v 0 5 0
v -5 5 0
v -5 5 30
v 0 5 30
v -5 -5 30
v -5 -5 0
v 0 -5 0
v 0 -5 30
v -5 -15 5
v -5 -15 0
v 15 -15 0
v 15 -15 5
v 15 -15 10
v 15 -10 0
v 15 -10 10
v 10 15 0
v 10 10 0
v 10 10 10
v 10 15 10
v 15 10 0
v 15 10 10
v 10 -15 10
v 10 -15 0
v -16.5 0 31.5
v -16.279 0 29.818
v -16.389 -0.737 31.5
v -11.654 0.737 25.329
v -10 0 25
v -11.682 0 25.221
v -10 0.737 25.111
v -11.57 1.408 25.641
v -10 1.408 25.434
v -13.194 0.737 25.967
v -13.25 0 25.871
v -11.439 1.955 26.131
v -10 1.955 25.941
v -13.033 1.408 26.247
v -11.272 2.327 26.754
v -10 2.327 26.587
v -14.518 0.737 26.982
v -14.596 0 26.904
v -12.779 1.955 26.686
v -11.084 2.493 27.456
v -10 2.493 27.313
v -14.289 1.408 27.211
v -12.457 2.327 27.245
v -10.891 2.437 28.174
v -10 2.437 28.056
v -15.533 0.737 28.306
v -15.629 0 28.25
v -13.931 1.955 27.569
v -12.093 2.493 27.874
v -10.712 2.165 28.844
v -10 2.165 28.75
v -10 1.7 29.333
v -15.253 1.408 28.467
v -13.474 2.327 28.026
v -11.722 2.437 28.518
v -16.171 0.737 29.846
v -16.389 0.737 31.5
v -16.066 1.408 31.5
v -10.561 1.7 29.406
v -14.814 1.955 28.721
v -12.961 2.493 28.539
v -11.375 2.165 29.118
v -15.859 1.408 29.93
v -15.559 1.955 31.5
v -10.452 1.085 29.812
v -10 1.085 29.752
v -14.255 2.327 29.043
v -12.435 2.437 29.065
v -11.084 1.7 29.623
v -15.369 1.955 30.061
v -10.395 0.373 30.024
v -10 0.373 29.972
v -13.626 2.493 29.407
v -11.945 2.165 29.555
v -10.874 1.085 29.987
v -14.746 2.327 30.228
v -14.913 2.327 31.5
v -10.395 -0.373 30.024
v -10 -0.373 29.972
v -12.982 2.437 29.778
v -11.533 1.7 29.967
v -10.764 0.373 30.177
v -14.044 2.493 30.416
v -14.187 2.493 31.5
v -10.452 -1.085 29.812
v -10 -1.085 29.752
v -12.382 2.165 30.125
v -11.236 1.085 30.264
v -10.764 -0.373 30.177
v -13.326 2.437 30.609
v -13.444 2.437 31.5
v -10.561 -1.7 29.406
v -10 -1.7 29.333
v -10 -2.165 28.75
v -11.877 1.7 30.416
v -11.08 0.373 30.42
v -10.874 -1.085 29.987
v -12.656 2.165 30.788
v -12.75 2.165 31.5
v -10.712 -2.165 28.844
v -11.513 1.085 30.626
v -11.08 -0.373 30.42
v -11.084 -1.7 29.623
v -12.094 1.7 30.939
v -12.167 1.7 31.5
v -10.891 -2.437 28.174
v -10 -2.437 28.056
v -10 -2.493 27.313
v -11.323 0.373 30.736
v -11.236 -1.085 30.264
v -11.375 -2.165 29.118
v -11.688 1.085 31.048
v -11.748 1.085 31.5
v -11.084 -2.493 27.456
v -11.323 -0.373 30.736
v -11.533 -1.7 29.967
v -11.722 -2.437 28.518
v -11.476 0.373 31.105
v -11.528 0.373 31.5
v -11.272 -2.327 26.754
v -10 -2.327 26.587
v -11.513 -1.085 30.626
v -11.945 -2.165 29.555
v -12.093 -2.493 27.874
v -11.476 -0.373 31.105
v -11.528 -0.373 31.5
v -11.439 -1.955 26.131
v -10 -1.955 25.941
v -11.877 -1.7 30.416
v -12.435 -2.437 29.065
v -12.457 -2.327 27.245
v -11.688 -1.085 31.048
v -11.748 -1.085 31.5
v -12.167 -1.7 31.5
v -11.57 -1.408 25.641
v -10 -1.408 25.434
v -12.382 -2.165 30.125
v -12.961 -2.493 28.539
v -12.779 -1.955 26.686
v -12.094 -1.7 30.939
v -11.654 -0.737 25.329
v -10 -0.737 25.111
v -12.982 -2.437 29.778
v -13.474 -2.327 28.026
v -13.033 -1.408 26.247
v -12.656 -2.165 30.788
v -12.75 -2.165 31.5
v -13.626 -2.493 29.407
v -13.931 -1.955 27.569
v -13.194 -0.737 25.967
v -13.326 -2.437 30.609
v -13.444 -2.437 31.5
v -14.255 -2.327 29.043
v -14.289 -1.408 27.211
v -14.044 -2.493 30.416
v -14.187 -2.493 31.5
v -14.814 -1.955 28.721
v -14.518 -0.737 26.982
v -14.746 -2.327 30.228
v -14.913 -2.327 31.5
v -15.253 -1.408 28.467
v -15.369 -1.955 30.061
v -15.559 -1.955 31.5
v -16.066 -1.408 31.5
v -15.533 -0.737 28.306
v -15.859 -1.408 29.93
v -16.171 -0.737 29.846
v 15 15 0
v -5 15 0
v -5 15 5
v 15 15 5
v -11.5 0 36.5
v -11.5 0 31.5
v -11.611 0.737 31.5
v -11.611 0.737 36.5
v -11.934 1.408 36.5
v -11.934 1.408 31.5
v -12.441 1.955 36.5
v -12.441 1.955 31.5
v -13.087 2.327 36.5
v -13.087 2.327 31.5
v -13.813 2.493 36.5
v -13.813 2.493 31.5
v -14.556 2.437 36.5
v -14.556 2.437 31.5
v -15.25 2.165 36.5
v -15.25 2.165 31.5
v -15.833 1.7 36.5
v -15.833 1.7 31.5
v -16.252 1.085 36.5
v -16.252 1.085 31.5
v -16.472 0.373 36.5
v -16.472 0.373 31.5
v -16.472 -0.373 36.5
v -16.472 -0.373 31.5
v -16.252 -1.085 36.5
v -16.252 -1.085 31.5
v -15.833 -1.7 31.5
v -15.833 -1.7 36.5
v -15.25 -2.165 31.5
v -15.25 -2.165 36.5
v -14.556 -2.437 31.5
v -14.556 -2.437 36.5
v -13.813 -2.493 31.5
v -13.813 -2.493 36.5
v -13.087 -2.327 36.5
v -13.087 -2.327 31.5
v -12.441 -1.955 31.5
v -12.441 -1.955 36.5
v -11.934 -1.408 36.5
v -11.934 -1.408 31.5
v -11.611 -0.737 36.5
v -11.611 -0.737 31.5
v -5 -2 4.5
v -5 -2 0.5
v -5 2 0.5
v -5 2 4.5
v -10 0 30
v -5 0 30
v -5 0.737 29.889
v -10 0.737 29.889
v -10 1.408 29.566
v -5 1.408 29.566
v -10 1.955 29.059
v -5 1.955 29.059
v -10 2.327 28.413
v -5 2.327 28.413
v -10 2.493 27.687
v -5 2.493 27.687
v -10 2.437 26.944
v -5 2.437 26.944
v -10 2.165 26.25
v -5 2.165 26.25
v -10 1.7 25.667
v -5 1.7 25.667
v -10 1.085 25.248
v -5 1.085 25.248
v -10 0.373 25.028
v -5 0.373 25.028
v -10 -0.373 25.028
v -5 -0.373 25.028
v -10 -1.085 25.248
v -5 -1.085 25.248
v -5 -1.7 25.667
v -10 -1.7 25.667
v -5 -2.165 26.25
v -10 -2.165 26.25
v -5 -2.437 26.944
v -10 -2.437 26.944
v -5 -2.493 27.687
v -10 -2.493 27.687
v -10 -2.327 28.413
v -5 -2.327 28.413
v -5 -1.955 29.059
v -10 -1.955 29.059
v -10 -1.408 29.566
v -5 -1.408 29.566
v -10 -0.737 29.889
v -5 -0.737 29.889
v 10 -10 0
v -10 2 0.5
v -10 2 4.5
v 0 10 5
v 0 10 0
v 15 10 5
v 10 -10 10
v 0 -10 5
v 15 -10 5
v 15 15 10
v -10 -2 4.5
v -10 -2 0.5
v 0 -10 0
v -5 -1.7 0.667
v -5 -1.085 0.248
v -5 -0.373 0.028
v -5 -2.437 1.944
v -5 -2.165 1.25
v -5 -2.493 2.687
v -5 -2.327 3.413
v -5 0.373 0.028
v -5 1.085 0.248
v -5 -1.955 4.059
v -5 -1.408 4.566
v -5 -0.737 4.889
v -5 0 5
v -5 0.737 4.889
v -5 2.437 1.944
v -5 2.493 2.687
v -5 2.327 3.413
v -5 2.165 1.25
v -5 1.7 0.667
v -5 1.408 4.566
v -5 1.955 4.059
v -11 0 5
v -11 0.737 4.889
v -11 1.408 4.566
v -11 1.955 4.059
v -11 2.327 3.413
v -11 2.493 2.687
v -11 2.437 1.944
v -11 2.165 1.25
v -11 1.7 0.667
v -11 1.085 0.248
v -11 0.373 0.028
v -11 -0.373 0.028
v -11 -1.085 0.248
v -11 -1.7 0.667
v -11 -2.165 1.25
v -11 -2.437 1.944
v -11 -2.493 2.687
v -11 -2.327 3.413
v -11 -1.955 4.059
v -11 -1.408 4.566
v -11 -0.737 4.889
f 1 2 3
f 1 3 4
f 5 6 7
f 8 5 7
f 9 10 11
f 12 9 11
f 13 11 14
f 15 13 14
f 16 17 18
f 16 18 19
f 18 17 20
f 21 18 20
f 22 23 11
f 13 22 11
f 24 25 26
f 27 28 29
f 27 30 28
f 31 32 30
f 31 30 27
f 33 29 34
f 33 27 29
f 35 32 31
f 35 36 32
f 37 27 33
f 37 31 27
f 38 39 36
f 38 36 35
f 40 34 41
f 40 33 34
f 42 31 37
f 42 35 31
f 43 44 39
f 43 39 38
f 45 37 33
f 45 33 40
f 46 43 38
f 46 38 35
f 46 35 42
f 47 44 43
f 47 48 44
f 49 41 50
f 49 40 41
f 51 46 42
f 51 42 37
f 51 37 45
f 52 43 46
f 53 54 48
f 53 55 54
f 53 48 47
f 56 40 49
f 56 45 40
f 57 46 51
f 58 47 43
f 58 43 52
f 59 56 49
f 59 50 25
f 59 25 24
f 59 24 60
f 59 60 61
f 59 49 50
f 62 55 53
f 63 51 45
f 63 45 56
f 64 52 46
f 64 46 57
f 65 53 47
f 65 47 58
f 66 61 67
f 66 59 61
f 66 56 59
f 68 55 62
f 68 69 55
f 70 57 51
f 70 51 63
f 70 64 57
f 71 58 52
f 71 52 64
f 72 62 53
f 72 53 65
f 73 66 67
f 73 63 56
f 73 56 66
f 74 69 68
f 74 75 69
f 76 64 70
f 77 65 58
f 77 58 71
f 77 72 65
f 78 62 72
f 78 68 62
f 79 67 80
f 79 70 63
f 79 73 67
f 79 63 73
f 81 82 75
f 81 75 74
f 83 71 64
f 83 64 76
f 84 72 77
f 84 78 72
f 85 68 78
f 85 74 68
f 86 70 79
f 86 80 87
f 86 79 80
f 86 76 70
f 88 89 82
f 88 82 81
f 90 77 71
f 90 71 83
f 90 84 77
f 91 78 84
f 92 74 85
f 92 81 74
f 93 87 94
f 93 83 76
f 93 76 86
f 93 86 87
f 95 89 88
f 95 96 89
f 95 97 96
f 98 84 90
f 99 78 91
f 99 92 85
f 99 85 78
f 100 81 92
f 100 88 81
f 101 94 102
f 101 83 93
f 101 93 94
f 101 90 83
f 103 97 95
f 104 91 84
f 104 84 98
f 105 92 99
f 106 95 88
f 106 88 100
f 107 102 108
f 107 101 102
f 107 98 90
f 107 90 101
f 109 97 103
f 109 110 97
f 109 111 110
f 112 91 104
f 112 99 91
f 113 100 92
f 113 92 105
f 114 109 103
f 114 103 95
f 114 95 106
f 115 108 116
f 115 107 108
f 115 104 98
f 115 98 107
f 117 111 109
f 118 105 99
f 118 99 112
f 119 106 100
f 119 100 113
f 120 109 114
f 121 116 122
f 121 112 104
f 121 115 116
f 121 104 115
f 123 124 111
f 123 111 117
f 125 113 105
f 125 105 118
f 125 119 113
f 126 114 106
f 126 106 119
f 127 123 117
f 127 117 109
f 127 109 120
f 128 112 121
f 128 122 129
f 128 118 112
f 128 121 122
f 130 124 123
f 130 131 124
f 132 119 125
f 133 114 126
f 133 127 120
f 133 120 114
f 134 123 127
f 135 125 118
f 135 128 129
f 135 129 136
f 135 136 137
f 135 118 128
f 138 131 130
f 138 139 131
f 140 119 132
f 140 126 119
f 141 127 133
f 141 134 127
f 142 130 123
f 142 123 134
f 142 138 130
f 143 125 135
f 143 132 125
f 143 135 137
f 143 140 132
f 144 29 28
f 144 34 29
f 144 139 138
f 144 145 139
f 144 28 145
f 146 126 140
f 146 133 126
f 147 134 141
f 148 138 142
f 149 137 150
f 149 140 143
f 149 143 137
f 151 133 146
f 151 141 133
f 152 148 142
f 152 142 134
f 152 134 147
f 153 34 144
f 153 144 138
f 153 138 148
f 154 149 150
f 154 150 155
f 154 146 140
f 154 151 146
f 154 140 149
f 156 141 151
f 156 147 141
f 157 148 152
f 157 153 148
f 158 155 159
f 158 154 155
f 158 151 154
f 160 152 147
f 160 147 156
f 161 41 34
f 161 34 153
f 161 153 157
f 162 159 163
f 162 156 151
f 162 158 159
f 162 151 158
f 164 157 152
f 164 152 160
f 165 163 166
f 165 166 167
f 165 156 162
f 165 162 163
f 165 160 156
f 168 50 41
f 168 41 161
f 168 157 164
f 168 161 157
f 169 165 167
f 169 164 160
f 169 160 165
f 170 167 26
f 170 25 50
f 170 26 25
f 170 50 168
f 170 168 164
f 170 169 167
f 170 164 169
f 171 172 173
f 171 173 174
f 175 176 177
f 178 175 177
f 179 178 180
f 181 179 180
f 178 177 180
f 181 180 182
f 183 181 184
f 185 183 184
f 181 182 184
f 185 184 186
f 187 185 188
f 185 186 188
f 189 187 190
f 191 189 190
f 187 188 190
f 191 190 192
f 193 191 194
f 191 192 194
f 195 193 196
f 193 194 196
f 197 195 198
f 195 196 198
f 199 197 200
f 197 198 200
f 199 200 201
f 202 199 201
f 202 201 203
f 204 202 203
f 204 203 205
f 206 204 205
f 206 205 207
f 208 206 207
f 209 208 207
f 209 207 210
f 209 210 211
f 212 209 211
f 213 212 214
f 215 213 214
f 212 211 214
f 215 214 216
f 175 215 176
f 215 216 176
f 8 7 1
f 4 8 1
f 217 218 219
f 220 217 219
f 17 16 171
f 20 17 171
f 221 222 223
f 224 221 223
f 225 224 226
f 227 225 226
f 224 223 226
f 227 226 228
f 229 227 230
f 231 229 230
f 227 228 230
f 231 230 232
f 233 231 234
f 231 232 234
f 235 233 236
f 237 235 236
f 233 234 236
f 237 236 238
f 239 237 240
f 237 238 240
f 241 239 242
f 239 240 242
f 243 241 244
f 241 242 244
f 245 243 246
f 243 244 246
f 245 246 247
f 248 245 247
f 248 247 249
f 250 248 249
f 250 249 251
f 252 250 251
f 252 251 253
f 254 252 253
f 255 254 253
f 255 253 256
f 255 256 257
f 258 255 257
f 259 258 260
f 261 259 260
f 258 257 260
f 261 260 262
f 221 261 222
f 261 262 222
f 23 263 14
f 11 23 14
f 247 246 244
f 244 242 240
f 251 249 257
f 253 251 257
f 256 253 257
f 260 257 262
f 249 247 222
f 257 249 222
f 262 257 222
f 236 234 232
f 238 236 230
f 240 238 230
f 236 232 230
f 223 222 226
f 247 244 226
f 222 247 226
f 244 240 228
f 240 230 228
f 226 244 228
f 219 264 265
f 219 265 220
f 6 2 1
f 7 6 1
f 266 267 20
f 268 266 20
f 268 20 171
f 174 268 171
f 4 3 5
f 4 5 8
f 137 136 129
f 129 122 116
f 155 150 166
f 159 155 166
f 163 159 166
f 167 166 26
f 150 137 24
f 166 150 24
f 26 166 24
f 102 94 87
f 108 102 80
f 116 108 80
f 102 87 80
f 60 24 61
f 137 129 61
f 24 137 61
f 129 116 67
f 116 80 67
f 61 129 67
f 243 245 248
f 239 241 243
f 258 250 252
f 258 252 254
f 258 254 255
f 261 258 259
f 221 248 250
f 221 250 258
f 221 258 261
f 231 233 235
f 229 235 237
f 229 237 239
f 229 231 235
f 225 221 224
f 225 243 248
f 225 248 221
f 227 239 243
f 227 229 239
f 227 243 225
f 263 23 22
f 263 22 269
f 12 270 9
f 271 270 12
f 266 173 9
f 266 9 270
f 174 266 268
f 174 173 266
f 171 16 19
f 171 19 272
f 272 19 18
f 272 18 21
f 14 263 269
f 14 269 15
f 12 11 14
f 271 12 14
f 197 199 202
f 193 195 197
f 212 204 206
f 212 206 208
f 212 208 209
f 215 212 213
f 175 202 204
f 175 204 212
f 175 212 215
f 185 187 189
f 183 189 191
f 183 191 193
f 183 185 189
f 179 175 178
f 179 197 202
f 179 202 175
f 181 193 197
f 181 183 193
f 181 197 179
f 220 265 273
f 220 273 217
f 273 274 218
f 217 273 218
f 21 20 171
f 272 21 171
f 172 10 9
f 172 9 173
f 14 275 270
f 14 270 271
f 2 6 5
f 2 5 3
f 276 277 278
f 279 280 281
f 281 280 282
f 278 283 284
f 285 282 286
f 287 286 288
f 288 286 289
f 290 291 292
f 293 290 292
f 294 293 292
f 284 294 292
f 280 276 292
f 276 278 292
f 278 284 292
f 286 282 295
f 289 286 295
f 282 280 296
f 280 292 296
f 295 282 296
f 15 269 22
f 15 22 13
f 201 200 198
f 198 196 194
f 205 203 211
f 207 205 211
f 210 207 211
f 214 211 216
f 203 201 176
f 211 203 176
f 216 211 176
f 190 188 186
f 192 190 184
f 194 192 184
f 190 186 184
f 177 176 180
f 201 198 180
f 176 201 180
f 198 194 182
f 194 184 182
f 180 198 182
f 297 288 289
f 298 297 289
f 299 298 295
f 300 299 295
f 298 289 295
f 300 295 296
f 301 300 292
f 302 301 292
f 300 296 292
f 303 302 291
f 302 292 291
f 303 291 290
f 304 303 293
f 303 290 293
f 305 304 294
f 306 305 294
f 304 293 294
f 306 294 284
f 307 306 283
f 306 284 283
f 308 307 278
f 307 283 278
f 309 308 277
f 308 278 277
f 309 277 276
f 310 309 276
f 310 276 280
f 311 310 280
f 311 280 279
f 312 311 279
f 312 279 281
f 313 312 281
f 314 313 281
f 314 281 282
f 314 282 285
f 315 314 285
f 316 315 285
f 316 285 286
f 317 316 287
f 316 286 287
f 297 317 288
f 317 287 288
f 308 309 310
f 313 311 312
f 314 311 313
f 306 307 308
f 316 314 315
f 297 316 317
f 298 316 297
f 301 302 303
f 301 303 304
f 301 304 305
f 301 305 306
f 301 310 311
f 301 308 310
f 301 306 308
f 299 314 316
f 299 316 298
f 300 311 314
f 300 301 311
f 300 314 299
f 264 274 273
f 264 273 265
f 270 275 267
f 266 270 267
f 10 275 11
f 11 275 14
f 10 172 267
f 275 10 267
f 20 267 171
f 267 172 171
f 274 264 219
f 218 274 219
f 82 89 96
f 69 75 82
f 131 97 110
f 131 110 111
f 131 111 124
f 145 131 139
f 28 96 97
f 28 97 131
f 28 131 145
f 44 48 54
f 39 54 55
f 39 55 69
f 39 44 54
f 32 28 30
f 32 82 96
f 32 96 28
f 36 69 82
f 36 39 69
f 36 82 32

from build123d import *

# Parameters (mm, degrees)
CYLINDER002_R           = 2.5
CYLINDER002_DEPTH       = 6
CYLINDER002_PITCH_ANGLE = -90
BOX001_W                = 5
BOX001_H                = 10
BOX001_DEPTH            = 30
CYLINDER003_R           = 2.5
CYLINDER003_DEPTH       = 5
CYLINDER003_PITCH_ANGLE = -90
TORUS_R                 = 2.5
TORUS_ANGLE             = 90
CYLINDER004_R           = 2.5
CYLINDER004_DEPTH       = 5
BOX002_W                = 5
BOX002_H                = 4
BOX002_DEPTH            = 4
BOX003_W                = 15
BOX003_H                = 20
BOX003_DEPTH            = 10
BOX_W                   = 20
BOX_H                   = 30
BOX_DEPTH               = 5
BOX004_W                = 5
BOX004_H                = 5
BOX004_DEPTH            = 10
BOX005_W                = 5
BOX005_H                = 5
BOX005_DEPTH            = 10


with BuildPart() as cylinder002:
    # Cylinder002 → Cylinder002 (new body)
    with BuildSketch(Plane.XY):
        Circle(CYLINDER002_R)
    extrude(amount=CYLINDER002_DEPTH)


with BuildPart() as cylinder002_1:
    # Cylinder002 pitch: moved
    add(cylinder002.part.rotate(Axis((0, 0, 0), (0, 1, 0)), CYLINDER002_PITCH_ANGLE))


with BuildPart() as cylinder002_2:
    # Cylinder002 placement: moved
    add(cylinder002_1.part.moved(Location((-5, 0, 2.5))))


with BuildPart() as cube001:
    # Box001 → Box001 (new body)
    with BuildSketch(Plane(origin=(-5, -5, 0), x_dir=(1, 0, 0), z_dir=(0, 0, 1))):
        with Locations((2.5, 5)):
            Rectangle(BOX001_W, BOX001_H)
    extrude(amount=BOX001_DEPTH)


with BuildPart() as cylinder003:
    # Cylinder003 → Cylinder003 (new body)
    with BuildSketch(Plane.XY):
        Circle(CYLINDER003_R)
    extrude(amount=CYLINDER003_DEPTH)


with BuildPart() as cylinder003_1:
    # Cylinder003 pitch: moved
    add(cylinder003.part.rotate(Axis((0, 0, 0), (0, 1, 0)), CYLINDER003_PITCH_ANGLE))


with BuildPart() as cylinder003_2:
    # Cylinder003 placement: moved
    add(cylinder003_1.part.moved(Location((-5, 0, 27.5))))


with BuildPart() as torus:
    # Torus → Torus (revolve)
    with BuildSketch(Plane(origin=(-10, 0, 31.5), x_dir=(0, 0, -1), z_dir=(1, 0, 0))):
        with Locations((4, 0)):
            Circle(TORUS_R)
    revolve(axis=Axis((-10, 0, 31.5), (0, 1, 0)), revolution_arc=TORUS_ANGLE)


with BuildPart() as cylinder004:
    # Cylinder004 → Cylinder004 (new body)
    with BuildSketch(Plane(origin=(-14, 0, 31.5), x_dir=(1, 0, 0), z_dir=(0, 0, 1))):
        Circle(CYLINDER004_R)
    extrude(amount=CYLINDER004_DEPTH)


with BuildPart() as cube002:
    # Box002 → Box002 (new body)
    with BuildSketch(Plane(origin=(-10, -2, 0.5), x_dir=(1, 0, 0), z_dir=(0, 0, 1))):
        with Locations((2.5, 2)):
            Rectangle(BOX002_W, BOX002_H)
    extrude(amount=BOX002_DEPTH)


with BuildPart() as cube003:
    # Box003 → Box003 (new body)
    with BuildSketch(Plane(origin=(0, -10, 0), x_dir=(1, 0, 0), z_dir=(0, 0, 1))):
        with Locations((7.5, 10)):
            Rectangle(BOX003_W, BOX003_H)
    extrude(amount=BOX003_DEPTH)


with BuildPart() as cut:
    # Box → Box (new body)
    with BuildSketch(Plane(origin=(-5, -15, 0), x_dir=(1, 0, 0), z_dir=(0, 0, 1))):
        with Locations((10, 15)):
            Rectangle(BOX_W, BOX_H)
    extrude(amount=BOX_DEPTH)

    # Cut: cut Cube003
    add(cube003.part, mode=Mode.SUBTRACT)


with BuildPart() as cube004:
    # Box004 → Box004 (new body)
    with BuildSketch(Plane(origin=(10, 10, 0), x_dir=(1, 0, 0), z_dir=(0, 0, 1))):
        with Locations((2.5, 2.5)):
            Rectangle(BOX004_W, BOX004_H)
    extrude(amount=BOX004_DEPTH)


with BuildPart() as cube005:
    # Box005 → Box005 (new body)
    with BuildSketch(Plane(origin=(10, -15, 0), x_dir=(1, 0, 0), z_dir=(0, 0, 1))):
        with Locations((2.5, 2.5)):
            Rectangle(BOX005_W, BOX005_H)
    extrude(amount=BOX005_DEPTH)


solid = Compound([cylinder002_2.part, cube001.part, cylinder003_2.part, torus.part, cylinder004.part, cube002.part, cut.part, cube004.part, cube005.part])
